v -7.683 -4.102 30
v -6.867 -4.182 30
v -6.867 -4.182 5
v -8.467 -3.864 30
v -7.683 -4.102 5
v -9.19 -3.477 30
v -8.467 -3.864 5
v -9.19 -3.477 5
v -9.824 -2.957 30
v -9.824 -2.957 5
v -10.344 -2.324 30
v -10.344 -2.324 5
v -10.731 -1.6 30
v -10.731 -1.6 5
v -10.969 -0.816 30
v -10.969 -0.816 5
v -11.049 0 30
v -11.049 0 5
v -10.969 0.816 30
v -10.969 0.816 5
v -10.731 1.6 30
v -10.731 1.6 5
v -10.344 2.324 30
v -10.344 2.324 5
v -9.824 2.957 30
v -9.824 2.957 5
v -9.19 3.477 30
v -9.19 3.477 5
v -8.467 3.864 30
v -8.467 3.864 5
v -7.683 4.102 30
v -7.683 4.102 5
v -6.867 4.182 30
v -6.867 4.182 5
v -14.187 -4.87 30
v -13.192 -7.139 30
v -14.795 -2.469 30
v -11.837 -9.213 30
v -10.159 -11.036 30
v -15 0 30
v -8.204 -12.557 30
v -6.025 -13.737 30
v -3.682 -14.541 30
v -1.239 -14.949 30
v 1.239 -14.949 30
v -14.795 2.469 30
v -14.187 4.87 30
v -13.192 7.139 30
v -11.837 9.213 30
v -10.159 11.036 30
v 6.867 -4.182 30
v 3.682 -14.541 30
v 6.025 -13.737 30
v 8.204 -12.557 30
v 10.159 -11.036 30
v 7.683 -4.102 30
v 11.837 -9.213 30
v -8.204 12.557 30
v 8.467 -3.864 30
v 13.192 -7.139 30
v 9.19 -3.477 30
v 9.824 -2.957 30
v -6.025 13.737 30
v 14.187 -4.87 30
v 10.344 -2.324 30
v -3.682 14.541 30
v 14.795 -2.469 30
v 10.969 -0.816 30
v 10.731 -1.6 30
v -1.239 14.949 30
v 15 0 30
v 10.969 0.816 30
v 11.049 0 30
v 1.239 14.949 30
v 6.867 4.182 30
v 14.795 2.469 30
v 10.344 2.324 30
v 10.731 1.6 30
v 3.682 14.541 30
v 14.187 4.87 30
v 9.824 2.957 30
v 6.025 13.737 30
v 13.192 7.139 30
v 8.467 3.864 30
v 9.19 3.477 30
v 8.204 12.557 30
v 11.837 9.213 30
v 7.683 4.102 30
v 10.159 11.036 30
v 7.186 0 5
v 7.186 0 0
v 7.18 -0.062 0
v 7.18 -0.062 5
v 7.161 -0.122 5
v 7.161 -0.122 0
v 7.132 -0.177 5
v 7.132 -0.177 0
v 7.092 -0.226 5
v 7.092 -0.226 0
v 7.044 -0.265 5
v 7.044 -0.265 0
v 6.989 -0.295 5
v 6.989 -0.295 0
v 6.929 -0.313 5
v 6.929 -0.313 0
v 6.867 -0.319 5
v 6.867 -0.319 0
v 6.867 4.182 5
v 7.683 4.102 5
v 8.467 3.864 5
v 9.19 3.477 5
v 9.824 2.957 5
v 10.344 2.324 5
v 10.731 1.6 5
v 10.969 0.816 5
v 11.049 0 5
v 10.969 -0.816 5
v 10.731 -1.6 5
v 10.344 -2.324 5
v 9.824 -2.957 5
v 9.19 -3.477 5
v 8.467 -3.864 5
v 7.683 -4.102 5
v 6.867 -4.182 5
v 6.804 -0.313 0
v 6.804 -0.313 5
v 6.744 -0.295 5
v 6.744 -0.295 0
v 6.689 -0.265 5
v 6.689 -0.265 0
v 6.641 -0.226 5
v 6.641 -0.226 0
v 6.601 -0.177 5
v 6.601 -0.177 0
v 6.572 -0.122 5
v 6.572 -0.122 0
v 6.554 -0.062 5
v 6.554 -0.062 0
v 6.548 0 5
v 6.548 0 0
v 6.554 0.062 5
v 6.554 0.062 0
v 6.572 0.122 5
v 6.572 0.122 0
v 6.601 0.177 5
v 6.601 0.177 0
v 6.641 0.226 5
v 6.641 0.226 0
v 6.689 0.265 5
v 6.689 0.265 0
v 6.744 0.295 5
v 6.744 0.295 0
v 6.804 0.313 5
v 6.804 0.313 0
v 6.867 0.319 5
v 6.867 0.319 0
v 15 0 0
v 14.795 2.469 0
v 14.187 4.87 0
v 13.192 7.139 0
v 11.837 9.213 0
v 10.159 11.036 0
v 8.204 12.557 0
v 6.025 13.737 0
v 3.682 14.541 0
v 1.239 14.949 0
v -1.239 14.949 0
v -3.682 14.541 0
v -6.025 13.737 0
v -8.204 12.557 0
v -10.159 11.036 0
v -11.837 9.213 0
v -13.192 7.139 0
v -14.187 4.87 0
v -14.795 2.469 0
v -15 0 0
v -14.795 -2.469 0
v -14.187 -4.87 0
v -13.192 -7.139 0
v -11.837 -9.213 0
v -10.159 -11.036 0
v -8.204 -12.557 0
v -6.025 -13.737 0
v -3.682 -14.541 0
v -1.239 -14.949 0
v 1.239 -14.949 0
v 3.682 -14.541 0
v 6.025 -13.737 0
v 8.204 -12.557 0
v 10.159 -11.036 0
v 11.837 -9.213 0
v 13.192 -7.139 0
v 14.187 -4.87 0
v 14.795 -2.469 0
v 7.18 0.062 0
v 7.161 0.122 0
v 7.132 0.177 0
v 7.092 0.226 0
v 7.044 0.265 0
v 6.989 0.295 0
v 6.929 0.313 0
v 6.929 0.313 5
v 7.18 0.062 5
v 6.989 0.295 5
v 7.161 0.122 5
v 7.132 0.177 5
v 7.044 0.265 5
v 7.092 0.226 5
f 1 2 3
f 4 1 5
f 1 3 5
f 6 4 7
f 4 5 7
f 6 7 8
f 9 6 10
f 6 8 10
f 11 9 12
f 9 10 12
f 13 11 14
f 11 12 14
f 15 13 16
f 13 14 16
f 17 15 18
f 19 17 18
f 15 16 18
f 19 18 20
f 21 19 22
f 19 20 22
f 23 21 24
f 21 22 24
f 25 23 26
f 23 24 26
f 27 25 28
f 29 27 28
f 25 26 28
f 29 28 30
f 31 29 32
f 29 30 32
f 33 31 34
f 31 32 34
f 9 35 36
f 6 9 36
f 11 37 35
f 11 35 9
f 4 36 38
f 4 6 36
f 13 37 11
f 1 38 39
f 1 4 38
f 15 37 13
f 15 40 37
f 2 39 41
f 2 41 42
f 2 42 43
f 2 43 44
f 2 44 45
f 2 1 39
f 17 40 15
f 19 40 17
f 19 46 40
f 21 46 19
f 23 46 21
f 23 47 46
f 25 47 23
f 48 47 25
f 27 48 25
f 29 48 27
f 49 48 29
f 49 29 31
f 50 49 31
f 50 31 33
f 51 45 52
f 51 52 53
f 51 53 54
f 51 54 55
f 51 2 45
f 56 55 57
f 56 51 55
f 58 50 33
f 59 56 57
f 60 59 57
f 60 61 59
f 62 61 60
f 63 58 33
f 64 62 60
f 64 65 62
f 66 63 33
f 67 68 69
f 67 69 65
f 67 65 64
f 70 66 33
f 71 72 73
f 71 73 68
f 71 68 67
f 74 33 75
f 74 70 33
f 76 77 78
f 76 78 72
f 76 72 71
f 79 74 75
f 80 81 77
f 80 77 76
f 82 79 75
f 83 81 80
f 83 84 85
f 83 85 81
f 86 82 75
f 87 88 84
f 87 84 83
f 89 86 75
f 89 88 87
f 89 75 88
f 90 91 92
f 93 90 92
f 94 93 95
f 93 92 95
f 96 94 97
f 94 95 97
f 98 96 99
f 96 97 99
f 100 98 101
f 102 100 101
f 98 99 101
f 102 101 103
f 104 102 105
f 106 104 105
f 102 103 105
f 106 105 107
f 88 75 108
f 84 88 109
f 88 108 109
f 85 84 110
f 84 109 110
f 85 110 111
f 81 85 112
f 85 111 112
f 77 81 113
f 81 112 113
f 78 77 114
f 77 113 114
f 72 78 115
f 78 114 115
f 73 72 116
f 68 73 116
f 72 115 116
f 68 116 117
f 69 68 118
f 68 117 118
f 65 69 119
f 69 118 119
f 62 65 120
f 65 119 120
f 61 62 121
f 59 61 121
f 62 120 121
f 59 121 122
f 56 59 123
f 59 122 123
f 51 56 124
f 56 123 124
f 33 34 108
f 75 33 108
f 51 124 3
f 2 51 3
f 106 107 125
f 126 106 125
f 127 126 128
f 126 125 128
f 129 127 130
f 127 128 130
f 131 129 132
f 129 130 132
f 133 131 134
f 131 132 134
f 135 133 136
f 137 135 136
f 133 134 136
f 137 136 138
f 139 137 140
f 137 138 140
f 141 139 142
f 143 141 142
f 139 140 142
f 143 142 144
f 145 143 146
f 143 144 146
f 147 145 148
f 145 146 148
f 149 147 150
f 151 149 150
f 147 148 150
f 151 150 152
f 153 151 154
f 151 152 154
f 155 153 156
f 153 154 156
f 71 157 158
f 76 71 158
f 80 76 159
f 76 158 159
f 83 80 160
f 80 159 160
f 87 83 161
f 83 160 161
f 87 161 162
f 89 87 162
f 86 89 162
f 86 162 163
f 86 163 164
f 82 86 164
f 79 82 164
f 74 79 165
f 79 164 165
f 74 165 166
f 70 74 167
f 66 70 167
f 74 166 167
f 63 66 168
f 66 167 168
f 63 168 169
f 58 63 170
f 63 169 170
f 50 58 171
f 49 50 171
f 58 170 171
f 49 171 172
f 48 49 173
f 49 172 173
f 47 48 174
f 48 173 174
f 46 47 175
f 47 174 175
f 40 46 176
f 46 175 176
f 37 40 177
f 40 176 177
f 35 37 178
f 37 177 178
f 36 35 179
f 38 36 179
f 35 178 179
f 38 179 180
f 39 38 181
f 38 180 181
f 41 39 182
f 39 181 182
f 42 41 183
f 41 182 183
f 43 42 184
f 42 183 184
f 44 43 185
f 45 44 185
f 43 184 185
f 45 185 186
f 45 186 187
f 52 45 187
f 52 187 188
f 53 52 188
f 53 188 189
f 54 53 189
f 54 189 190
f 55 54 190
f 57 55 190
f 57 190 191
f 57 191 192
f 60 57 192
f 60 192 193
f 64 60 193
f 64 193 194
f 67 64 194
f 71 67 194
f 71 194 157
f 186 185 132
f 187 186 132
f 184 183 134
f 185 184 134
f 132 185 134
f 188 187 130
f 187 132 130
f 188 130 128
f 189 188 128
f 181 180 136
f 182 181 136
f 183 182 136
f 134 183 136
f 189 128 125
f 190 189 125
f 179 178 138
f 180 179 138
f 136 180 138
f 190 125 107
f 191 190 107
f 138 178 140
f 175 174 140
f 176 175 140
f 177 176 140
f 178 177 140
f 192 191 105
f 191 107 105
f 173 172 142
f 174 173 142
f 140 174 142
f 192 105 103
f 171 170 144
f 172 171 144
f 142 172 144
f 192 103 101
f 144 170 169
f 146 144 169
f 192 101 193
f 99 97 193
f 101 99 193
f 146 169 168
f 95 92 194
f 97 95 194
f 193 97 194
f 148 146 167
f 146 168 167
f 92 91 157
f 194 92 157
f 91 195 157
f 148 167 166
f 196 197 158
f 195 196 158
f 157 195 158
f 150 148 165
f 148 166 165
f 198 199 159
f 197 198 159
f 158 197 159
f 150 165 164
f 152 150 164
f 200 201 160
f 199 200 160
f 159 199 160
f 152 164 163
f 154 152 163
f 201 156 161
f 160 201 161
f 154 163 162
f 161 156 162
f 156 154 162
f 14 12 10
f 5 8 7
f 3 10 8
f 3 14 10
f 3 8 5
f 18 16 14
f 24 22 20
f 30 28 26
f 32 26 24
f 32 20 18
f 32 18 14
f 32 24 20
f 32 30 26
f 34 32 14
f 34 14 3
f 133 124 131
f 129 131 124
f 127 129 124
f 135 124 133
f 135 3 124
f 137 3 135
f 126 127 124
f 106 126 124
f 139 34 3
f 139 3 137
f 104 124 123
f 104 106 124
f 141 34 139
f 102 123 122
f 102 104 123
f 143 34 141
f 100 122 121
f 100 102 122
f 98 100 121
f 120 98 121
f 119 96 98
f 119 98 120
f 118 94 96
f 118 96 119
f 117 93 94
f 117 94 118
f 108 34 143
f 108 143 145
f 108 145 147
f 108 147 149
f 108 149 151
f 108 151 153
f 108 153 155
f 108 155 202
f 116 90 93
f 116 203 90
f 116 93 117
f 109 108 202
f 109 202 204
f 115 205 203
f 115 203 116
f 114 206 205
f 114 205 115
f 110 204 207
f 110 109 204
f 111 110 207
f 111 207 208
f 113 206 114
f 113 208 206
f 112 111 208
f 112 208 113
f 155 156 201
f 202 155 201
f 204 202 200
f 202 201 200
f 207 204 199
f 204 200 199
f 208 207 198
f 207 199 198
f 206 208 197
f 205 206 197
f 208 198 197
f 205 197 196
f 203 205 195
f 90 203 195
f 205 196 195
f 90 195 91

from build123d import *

# Parameters (mm, degrees)
F0_R     = 15
F1_DEPTH = 30
F2_DEPTH = 5


with BuildPart() as f1:
    # F0 (on Top) → F1 (new body)
    with BuildSketch(Plane.XY):
        Circle(F0_R)
        with BuildLine():
            Line((-6.866588, 4.182289), (6.866588, 4.182289))
            ThreePointArc((6.866588, 4.182289), (11.048877, 0), (6.866588, -4.182289))
            Line((6.866588, -4.182289), (-6.866588, -4.182289))
            ThreePointArc((-6.866588, -4.182289), (-11.048877, 0), (-6.866588, 4.182289))
        make_face(mode=Mode.SUBTRACT)
    extrude(amount=F1_DEPTH)

    # F0 (on Top) → F2 (join)
    with BuildSketch(Plane.XY):
        with BuildLine():
            ThreePointArc((6.866588, -4.182289), (11.048877, 0), (6.866588, 4.182289))
            Line((6.866588, 4.182289), (-6.866588, 4.182289))
            ThreePointArc((-6.866588, 4.182289), (-11.048877, 0), (-6.866588, -4.182289))
            Line((-6.866588, -4.182289), (6.866588, -4.182289))
        make_face()
        with BuildLine():
            ThreePointArc((6.866588, -0.319086), (6.547502, 0), (6.866588, 0.319086))
            ThreePointArc((6.866588, 0.319086), (7.092216, 0.225628), (7.185674, 0))
            ThreePointArc((7.185674, 0), (7.092216, -0.225628), (6.866588, -0.319086))
        make_face(mode=Mode.SUBTRACT)
    extrude(amount=F2_DEPTH)


solid = f1.part
